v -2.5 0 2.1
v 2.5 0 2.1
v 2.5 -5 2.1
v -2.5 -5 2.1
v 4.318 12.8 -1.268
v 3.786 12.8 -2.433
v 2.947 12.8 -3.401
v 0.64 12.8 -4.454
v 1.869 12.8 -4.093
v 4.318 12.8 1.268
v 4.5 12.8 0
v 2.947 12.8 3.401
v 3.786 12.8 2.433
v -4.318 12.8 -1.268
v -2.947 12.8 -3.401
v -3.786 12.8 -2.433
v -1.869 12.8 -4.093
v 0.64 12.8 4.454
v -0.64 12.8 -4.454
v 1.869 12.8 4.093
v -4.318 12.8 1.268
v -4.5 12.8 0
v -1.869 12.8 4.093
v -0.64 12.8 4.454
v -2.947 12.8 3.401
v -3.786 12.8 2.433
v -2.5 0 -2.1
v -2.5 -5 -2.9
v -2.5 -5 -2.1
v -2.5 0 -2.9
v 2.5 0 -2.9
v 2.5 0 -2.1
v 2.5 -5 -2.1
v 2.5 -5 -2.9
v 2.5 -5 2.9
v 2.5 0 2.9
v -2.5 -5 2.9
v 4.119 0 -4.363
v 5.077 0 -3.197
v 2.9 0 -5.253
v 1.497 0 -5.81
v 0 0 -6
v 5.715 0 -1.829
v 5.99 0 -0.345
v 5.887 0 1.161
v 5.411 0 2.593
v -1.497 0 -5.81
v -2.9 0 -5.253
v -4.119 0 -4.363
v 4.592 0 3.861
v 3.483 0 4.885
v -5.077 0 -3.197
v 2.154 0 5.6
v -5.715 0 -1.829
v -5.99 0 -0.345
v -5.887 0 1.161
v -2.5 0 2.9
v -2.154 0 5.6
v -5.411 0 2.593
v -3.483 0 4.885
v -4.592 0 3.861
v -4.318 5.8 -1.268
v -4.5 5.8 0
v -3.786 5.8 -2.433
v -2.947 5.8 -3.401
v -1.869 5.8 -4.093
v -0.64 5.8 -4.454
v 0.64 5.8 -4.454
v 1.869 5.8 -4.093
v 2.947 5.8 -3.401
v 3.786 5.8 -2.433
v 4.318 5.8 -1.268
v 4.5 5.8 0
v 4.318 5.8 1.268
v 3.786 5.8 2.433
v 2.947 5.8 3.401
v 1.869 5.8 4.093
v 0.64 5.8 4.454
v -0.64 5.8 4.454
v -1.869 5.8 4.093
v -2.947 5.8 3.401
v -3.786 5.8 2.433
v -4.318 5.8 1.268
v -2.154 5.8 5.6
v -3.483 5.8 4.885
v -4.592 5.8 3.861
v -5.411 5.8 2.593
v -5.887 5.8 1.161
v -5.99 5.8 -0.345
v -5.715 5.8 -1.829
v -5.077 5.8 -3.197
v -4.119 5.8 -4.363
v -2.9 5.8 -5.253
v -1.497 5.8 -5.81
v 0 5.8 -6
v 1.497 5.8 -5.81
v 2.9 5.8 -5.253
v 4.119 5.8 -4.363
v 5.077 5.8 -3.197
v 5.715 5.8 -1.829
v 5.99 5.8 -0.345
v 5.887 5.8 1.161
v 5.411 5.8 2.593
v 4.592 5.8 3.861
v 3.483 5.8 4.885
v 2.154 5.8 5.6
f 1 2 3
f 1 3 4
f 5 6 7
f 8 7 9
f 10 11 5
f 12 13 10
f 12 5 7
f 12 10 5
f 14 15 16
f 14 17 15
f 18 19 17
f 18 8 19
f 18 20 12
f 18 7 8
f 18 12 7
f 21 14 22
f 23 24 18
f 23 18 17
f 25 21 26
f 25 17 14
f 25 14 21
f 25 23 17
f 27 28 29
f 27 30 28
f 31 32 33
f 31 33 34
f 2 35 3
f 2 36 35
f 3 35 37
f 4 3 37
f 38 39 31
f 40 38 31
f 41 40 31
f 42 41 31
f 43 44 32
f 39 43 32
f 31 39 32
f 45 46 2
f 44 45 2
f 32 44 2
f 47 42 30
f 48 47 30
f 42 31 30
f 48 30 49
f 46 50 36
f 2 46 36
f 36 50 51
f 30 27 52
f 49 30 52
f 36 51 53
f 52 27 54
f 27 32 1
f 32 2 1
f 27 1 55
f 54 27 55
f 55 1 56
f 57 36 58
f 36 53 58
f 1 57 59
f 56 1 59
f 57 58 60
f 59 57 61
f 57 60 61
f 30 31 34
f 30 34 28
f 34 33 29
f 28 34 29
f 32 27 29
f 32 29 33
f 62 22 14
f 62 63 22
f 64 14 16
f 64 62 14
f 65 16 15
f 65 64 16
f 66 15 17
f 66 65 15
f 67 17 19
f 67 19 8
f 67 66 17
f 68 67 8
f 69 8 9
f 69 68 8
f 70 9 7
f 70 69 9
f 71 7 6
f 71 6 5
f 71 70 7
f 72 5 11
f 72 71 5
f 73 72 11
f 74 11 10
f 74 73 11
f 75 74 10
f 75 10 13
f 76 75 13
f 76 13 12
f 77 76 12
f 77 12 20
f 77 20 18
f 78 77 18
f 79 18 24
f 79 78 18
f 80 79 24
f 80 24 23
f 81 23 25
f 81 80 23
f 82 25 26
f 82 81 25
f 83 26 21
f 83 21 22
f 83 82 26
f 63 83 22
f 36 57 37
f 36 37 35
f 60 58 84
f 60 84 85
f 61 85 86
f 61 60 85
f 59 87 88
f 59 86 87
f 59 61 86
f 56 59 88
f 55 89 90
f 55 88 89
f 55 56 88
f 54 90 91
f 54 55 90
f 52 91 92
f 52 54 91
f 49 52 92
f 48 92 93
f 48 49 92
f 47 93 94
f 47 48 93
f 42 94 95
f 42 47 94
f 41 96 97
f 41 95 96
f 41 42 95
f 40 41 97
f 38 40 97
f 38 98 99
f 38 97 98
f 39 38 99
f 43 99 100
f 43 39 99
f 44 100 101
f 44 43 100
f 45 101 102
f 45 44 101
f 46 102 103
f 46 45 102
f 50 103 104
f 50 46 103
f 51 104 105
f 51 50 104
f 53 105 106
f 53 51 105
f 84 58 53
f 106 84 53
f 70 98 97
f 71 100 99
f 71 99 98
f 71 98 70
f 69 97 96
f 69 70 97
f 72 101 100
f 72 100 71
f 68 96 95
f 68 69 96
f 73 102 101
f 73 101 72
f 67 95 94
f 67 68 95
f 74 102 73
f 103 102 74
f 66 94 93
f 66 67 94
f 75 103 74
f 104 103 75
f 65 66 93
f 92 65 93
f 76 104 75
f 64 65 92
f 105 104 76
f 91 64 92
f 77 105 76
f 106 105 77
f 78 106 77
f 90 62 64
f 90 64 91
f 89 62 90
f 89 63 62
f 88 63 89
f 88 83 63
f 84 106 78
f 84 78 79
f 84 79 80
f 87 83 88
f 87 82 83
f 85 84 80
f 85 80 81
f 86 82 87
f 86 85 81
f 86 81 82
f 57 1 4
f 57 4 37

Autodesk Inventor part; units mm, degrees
ref_plane "YZ Plane" through (0, 0, 0) normal (1, 0, 0) x (0, 1, 0)
ref_plane "XZ Plane" through (0, 0, 0) normal (0, 1, 0) x (-1, 0, 0)
ref_plane "XY Plane" through (0, 0, 0) normal (0, 0, 1) x (1, 0, 0)
sketch "Sketch1" plane through (0, 0, 0) normal (0, 1, 0) x (-1, 0, 0)
  arc A0 (-2.1541, 5.6) -> (2.1541, 5.6) centre (0, 0) ccw
  circle A1 centre (0, 0) radius 4.5
  line L0 (0, 5.6) -> (2.1541, 5.6)
  line L1 (0, 5.6) -> (-2.1541, 5.6)
  line L2 (0, 5.6) -> (3.5069, 5.6) construction
  line L3 (2.5, 2.9) -> (-2.5, 2.9)
  line L4 (-2.5, 2.9) -> (-2.5, 2.1)
  line L5 (-2.5, 2.1) -> (2.5, 2.1)
  line L6 (2.5, 2.1) -> (2.5, 2.9)
  line L7 (-2.5, -2.9) -> (2.5, -2.9)
  line L8 (2.5, -2.9) -> (2.5, -2.1)
  line L9 (2.5, -2.1) -> (-2.5, -2.1)
  line L10 (-2.5, -2.1) -> (-2.5, -2.9)
  line L11 (-2.5, 2.5) -> (2.5, 2.5)
  line L12 (-2.5, -2.5) -> (2.5, -2.5)
  line L13 (-4.5, 0) -> (4.5, 0)
  dimension "d0" = 12
  dimension "d1" = 9
  dimension "d2" = 180
  dimension "d3" = 4.3081
  dimension "d8" = 5
  dimension "d9" = 0.8
  dimension "d10" = 5
  dimension "d11" = 0.8
  dimension "d16" = 2.5
  dimension "d17" = 2.5
extrude "Extrusion1" add sketch "Sketch1" along normal blind 5.8 contours L1 L0 A0
extrude "Extrusion2" add sketch "Sketch1" along normal blind 12.8 contours L13 A1 | A1 L13 | L6 L11 L4 L3 | L6 L5 L4 L11 | L10 L12 L8 L7 | L10 L9 L8 L12
extrude "Extrusion3" add sketch "Sketch1" against normal blind 5 contours L6 L11 L4 L3 | L6 L5 L4 L11 | L10 L12 L8 L7 | L10 L9 L8 L12
properties part number "D6R90 F1 LFS"
